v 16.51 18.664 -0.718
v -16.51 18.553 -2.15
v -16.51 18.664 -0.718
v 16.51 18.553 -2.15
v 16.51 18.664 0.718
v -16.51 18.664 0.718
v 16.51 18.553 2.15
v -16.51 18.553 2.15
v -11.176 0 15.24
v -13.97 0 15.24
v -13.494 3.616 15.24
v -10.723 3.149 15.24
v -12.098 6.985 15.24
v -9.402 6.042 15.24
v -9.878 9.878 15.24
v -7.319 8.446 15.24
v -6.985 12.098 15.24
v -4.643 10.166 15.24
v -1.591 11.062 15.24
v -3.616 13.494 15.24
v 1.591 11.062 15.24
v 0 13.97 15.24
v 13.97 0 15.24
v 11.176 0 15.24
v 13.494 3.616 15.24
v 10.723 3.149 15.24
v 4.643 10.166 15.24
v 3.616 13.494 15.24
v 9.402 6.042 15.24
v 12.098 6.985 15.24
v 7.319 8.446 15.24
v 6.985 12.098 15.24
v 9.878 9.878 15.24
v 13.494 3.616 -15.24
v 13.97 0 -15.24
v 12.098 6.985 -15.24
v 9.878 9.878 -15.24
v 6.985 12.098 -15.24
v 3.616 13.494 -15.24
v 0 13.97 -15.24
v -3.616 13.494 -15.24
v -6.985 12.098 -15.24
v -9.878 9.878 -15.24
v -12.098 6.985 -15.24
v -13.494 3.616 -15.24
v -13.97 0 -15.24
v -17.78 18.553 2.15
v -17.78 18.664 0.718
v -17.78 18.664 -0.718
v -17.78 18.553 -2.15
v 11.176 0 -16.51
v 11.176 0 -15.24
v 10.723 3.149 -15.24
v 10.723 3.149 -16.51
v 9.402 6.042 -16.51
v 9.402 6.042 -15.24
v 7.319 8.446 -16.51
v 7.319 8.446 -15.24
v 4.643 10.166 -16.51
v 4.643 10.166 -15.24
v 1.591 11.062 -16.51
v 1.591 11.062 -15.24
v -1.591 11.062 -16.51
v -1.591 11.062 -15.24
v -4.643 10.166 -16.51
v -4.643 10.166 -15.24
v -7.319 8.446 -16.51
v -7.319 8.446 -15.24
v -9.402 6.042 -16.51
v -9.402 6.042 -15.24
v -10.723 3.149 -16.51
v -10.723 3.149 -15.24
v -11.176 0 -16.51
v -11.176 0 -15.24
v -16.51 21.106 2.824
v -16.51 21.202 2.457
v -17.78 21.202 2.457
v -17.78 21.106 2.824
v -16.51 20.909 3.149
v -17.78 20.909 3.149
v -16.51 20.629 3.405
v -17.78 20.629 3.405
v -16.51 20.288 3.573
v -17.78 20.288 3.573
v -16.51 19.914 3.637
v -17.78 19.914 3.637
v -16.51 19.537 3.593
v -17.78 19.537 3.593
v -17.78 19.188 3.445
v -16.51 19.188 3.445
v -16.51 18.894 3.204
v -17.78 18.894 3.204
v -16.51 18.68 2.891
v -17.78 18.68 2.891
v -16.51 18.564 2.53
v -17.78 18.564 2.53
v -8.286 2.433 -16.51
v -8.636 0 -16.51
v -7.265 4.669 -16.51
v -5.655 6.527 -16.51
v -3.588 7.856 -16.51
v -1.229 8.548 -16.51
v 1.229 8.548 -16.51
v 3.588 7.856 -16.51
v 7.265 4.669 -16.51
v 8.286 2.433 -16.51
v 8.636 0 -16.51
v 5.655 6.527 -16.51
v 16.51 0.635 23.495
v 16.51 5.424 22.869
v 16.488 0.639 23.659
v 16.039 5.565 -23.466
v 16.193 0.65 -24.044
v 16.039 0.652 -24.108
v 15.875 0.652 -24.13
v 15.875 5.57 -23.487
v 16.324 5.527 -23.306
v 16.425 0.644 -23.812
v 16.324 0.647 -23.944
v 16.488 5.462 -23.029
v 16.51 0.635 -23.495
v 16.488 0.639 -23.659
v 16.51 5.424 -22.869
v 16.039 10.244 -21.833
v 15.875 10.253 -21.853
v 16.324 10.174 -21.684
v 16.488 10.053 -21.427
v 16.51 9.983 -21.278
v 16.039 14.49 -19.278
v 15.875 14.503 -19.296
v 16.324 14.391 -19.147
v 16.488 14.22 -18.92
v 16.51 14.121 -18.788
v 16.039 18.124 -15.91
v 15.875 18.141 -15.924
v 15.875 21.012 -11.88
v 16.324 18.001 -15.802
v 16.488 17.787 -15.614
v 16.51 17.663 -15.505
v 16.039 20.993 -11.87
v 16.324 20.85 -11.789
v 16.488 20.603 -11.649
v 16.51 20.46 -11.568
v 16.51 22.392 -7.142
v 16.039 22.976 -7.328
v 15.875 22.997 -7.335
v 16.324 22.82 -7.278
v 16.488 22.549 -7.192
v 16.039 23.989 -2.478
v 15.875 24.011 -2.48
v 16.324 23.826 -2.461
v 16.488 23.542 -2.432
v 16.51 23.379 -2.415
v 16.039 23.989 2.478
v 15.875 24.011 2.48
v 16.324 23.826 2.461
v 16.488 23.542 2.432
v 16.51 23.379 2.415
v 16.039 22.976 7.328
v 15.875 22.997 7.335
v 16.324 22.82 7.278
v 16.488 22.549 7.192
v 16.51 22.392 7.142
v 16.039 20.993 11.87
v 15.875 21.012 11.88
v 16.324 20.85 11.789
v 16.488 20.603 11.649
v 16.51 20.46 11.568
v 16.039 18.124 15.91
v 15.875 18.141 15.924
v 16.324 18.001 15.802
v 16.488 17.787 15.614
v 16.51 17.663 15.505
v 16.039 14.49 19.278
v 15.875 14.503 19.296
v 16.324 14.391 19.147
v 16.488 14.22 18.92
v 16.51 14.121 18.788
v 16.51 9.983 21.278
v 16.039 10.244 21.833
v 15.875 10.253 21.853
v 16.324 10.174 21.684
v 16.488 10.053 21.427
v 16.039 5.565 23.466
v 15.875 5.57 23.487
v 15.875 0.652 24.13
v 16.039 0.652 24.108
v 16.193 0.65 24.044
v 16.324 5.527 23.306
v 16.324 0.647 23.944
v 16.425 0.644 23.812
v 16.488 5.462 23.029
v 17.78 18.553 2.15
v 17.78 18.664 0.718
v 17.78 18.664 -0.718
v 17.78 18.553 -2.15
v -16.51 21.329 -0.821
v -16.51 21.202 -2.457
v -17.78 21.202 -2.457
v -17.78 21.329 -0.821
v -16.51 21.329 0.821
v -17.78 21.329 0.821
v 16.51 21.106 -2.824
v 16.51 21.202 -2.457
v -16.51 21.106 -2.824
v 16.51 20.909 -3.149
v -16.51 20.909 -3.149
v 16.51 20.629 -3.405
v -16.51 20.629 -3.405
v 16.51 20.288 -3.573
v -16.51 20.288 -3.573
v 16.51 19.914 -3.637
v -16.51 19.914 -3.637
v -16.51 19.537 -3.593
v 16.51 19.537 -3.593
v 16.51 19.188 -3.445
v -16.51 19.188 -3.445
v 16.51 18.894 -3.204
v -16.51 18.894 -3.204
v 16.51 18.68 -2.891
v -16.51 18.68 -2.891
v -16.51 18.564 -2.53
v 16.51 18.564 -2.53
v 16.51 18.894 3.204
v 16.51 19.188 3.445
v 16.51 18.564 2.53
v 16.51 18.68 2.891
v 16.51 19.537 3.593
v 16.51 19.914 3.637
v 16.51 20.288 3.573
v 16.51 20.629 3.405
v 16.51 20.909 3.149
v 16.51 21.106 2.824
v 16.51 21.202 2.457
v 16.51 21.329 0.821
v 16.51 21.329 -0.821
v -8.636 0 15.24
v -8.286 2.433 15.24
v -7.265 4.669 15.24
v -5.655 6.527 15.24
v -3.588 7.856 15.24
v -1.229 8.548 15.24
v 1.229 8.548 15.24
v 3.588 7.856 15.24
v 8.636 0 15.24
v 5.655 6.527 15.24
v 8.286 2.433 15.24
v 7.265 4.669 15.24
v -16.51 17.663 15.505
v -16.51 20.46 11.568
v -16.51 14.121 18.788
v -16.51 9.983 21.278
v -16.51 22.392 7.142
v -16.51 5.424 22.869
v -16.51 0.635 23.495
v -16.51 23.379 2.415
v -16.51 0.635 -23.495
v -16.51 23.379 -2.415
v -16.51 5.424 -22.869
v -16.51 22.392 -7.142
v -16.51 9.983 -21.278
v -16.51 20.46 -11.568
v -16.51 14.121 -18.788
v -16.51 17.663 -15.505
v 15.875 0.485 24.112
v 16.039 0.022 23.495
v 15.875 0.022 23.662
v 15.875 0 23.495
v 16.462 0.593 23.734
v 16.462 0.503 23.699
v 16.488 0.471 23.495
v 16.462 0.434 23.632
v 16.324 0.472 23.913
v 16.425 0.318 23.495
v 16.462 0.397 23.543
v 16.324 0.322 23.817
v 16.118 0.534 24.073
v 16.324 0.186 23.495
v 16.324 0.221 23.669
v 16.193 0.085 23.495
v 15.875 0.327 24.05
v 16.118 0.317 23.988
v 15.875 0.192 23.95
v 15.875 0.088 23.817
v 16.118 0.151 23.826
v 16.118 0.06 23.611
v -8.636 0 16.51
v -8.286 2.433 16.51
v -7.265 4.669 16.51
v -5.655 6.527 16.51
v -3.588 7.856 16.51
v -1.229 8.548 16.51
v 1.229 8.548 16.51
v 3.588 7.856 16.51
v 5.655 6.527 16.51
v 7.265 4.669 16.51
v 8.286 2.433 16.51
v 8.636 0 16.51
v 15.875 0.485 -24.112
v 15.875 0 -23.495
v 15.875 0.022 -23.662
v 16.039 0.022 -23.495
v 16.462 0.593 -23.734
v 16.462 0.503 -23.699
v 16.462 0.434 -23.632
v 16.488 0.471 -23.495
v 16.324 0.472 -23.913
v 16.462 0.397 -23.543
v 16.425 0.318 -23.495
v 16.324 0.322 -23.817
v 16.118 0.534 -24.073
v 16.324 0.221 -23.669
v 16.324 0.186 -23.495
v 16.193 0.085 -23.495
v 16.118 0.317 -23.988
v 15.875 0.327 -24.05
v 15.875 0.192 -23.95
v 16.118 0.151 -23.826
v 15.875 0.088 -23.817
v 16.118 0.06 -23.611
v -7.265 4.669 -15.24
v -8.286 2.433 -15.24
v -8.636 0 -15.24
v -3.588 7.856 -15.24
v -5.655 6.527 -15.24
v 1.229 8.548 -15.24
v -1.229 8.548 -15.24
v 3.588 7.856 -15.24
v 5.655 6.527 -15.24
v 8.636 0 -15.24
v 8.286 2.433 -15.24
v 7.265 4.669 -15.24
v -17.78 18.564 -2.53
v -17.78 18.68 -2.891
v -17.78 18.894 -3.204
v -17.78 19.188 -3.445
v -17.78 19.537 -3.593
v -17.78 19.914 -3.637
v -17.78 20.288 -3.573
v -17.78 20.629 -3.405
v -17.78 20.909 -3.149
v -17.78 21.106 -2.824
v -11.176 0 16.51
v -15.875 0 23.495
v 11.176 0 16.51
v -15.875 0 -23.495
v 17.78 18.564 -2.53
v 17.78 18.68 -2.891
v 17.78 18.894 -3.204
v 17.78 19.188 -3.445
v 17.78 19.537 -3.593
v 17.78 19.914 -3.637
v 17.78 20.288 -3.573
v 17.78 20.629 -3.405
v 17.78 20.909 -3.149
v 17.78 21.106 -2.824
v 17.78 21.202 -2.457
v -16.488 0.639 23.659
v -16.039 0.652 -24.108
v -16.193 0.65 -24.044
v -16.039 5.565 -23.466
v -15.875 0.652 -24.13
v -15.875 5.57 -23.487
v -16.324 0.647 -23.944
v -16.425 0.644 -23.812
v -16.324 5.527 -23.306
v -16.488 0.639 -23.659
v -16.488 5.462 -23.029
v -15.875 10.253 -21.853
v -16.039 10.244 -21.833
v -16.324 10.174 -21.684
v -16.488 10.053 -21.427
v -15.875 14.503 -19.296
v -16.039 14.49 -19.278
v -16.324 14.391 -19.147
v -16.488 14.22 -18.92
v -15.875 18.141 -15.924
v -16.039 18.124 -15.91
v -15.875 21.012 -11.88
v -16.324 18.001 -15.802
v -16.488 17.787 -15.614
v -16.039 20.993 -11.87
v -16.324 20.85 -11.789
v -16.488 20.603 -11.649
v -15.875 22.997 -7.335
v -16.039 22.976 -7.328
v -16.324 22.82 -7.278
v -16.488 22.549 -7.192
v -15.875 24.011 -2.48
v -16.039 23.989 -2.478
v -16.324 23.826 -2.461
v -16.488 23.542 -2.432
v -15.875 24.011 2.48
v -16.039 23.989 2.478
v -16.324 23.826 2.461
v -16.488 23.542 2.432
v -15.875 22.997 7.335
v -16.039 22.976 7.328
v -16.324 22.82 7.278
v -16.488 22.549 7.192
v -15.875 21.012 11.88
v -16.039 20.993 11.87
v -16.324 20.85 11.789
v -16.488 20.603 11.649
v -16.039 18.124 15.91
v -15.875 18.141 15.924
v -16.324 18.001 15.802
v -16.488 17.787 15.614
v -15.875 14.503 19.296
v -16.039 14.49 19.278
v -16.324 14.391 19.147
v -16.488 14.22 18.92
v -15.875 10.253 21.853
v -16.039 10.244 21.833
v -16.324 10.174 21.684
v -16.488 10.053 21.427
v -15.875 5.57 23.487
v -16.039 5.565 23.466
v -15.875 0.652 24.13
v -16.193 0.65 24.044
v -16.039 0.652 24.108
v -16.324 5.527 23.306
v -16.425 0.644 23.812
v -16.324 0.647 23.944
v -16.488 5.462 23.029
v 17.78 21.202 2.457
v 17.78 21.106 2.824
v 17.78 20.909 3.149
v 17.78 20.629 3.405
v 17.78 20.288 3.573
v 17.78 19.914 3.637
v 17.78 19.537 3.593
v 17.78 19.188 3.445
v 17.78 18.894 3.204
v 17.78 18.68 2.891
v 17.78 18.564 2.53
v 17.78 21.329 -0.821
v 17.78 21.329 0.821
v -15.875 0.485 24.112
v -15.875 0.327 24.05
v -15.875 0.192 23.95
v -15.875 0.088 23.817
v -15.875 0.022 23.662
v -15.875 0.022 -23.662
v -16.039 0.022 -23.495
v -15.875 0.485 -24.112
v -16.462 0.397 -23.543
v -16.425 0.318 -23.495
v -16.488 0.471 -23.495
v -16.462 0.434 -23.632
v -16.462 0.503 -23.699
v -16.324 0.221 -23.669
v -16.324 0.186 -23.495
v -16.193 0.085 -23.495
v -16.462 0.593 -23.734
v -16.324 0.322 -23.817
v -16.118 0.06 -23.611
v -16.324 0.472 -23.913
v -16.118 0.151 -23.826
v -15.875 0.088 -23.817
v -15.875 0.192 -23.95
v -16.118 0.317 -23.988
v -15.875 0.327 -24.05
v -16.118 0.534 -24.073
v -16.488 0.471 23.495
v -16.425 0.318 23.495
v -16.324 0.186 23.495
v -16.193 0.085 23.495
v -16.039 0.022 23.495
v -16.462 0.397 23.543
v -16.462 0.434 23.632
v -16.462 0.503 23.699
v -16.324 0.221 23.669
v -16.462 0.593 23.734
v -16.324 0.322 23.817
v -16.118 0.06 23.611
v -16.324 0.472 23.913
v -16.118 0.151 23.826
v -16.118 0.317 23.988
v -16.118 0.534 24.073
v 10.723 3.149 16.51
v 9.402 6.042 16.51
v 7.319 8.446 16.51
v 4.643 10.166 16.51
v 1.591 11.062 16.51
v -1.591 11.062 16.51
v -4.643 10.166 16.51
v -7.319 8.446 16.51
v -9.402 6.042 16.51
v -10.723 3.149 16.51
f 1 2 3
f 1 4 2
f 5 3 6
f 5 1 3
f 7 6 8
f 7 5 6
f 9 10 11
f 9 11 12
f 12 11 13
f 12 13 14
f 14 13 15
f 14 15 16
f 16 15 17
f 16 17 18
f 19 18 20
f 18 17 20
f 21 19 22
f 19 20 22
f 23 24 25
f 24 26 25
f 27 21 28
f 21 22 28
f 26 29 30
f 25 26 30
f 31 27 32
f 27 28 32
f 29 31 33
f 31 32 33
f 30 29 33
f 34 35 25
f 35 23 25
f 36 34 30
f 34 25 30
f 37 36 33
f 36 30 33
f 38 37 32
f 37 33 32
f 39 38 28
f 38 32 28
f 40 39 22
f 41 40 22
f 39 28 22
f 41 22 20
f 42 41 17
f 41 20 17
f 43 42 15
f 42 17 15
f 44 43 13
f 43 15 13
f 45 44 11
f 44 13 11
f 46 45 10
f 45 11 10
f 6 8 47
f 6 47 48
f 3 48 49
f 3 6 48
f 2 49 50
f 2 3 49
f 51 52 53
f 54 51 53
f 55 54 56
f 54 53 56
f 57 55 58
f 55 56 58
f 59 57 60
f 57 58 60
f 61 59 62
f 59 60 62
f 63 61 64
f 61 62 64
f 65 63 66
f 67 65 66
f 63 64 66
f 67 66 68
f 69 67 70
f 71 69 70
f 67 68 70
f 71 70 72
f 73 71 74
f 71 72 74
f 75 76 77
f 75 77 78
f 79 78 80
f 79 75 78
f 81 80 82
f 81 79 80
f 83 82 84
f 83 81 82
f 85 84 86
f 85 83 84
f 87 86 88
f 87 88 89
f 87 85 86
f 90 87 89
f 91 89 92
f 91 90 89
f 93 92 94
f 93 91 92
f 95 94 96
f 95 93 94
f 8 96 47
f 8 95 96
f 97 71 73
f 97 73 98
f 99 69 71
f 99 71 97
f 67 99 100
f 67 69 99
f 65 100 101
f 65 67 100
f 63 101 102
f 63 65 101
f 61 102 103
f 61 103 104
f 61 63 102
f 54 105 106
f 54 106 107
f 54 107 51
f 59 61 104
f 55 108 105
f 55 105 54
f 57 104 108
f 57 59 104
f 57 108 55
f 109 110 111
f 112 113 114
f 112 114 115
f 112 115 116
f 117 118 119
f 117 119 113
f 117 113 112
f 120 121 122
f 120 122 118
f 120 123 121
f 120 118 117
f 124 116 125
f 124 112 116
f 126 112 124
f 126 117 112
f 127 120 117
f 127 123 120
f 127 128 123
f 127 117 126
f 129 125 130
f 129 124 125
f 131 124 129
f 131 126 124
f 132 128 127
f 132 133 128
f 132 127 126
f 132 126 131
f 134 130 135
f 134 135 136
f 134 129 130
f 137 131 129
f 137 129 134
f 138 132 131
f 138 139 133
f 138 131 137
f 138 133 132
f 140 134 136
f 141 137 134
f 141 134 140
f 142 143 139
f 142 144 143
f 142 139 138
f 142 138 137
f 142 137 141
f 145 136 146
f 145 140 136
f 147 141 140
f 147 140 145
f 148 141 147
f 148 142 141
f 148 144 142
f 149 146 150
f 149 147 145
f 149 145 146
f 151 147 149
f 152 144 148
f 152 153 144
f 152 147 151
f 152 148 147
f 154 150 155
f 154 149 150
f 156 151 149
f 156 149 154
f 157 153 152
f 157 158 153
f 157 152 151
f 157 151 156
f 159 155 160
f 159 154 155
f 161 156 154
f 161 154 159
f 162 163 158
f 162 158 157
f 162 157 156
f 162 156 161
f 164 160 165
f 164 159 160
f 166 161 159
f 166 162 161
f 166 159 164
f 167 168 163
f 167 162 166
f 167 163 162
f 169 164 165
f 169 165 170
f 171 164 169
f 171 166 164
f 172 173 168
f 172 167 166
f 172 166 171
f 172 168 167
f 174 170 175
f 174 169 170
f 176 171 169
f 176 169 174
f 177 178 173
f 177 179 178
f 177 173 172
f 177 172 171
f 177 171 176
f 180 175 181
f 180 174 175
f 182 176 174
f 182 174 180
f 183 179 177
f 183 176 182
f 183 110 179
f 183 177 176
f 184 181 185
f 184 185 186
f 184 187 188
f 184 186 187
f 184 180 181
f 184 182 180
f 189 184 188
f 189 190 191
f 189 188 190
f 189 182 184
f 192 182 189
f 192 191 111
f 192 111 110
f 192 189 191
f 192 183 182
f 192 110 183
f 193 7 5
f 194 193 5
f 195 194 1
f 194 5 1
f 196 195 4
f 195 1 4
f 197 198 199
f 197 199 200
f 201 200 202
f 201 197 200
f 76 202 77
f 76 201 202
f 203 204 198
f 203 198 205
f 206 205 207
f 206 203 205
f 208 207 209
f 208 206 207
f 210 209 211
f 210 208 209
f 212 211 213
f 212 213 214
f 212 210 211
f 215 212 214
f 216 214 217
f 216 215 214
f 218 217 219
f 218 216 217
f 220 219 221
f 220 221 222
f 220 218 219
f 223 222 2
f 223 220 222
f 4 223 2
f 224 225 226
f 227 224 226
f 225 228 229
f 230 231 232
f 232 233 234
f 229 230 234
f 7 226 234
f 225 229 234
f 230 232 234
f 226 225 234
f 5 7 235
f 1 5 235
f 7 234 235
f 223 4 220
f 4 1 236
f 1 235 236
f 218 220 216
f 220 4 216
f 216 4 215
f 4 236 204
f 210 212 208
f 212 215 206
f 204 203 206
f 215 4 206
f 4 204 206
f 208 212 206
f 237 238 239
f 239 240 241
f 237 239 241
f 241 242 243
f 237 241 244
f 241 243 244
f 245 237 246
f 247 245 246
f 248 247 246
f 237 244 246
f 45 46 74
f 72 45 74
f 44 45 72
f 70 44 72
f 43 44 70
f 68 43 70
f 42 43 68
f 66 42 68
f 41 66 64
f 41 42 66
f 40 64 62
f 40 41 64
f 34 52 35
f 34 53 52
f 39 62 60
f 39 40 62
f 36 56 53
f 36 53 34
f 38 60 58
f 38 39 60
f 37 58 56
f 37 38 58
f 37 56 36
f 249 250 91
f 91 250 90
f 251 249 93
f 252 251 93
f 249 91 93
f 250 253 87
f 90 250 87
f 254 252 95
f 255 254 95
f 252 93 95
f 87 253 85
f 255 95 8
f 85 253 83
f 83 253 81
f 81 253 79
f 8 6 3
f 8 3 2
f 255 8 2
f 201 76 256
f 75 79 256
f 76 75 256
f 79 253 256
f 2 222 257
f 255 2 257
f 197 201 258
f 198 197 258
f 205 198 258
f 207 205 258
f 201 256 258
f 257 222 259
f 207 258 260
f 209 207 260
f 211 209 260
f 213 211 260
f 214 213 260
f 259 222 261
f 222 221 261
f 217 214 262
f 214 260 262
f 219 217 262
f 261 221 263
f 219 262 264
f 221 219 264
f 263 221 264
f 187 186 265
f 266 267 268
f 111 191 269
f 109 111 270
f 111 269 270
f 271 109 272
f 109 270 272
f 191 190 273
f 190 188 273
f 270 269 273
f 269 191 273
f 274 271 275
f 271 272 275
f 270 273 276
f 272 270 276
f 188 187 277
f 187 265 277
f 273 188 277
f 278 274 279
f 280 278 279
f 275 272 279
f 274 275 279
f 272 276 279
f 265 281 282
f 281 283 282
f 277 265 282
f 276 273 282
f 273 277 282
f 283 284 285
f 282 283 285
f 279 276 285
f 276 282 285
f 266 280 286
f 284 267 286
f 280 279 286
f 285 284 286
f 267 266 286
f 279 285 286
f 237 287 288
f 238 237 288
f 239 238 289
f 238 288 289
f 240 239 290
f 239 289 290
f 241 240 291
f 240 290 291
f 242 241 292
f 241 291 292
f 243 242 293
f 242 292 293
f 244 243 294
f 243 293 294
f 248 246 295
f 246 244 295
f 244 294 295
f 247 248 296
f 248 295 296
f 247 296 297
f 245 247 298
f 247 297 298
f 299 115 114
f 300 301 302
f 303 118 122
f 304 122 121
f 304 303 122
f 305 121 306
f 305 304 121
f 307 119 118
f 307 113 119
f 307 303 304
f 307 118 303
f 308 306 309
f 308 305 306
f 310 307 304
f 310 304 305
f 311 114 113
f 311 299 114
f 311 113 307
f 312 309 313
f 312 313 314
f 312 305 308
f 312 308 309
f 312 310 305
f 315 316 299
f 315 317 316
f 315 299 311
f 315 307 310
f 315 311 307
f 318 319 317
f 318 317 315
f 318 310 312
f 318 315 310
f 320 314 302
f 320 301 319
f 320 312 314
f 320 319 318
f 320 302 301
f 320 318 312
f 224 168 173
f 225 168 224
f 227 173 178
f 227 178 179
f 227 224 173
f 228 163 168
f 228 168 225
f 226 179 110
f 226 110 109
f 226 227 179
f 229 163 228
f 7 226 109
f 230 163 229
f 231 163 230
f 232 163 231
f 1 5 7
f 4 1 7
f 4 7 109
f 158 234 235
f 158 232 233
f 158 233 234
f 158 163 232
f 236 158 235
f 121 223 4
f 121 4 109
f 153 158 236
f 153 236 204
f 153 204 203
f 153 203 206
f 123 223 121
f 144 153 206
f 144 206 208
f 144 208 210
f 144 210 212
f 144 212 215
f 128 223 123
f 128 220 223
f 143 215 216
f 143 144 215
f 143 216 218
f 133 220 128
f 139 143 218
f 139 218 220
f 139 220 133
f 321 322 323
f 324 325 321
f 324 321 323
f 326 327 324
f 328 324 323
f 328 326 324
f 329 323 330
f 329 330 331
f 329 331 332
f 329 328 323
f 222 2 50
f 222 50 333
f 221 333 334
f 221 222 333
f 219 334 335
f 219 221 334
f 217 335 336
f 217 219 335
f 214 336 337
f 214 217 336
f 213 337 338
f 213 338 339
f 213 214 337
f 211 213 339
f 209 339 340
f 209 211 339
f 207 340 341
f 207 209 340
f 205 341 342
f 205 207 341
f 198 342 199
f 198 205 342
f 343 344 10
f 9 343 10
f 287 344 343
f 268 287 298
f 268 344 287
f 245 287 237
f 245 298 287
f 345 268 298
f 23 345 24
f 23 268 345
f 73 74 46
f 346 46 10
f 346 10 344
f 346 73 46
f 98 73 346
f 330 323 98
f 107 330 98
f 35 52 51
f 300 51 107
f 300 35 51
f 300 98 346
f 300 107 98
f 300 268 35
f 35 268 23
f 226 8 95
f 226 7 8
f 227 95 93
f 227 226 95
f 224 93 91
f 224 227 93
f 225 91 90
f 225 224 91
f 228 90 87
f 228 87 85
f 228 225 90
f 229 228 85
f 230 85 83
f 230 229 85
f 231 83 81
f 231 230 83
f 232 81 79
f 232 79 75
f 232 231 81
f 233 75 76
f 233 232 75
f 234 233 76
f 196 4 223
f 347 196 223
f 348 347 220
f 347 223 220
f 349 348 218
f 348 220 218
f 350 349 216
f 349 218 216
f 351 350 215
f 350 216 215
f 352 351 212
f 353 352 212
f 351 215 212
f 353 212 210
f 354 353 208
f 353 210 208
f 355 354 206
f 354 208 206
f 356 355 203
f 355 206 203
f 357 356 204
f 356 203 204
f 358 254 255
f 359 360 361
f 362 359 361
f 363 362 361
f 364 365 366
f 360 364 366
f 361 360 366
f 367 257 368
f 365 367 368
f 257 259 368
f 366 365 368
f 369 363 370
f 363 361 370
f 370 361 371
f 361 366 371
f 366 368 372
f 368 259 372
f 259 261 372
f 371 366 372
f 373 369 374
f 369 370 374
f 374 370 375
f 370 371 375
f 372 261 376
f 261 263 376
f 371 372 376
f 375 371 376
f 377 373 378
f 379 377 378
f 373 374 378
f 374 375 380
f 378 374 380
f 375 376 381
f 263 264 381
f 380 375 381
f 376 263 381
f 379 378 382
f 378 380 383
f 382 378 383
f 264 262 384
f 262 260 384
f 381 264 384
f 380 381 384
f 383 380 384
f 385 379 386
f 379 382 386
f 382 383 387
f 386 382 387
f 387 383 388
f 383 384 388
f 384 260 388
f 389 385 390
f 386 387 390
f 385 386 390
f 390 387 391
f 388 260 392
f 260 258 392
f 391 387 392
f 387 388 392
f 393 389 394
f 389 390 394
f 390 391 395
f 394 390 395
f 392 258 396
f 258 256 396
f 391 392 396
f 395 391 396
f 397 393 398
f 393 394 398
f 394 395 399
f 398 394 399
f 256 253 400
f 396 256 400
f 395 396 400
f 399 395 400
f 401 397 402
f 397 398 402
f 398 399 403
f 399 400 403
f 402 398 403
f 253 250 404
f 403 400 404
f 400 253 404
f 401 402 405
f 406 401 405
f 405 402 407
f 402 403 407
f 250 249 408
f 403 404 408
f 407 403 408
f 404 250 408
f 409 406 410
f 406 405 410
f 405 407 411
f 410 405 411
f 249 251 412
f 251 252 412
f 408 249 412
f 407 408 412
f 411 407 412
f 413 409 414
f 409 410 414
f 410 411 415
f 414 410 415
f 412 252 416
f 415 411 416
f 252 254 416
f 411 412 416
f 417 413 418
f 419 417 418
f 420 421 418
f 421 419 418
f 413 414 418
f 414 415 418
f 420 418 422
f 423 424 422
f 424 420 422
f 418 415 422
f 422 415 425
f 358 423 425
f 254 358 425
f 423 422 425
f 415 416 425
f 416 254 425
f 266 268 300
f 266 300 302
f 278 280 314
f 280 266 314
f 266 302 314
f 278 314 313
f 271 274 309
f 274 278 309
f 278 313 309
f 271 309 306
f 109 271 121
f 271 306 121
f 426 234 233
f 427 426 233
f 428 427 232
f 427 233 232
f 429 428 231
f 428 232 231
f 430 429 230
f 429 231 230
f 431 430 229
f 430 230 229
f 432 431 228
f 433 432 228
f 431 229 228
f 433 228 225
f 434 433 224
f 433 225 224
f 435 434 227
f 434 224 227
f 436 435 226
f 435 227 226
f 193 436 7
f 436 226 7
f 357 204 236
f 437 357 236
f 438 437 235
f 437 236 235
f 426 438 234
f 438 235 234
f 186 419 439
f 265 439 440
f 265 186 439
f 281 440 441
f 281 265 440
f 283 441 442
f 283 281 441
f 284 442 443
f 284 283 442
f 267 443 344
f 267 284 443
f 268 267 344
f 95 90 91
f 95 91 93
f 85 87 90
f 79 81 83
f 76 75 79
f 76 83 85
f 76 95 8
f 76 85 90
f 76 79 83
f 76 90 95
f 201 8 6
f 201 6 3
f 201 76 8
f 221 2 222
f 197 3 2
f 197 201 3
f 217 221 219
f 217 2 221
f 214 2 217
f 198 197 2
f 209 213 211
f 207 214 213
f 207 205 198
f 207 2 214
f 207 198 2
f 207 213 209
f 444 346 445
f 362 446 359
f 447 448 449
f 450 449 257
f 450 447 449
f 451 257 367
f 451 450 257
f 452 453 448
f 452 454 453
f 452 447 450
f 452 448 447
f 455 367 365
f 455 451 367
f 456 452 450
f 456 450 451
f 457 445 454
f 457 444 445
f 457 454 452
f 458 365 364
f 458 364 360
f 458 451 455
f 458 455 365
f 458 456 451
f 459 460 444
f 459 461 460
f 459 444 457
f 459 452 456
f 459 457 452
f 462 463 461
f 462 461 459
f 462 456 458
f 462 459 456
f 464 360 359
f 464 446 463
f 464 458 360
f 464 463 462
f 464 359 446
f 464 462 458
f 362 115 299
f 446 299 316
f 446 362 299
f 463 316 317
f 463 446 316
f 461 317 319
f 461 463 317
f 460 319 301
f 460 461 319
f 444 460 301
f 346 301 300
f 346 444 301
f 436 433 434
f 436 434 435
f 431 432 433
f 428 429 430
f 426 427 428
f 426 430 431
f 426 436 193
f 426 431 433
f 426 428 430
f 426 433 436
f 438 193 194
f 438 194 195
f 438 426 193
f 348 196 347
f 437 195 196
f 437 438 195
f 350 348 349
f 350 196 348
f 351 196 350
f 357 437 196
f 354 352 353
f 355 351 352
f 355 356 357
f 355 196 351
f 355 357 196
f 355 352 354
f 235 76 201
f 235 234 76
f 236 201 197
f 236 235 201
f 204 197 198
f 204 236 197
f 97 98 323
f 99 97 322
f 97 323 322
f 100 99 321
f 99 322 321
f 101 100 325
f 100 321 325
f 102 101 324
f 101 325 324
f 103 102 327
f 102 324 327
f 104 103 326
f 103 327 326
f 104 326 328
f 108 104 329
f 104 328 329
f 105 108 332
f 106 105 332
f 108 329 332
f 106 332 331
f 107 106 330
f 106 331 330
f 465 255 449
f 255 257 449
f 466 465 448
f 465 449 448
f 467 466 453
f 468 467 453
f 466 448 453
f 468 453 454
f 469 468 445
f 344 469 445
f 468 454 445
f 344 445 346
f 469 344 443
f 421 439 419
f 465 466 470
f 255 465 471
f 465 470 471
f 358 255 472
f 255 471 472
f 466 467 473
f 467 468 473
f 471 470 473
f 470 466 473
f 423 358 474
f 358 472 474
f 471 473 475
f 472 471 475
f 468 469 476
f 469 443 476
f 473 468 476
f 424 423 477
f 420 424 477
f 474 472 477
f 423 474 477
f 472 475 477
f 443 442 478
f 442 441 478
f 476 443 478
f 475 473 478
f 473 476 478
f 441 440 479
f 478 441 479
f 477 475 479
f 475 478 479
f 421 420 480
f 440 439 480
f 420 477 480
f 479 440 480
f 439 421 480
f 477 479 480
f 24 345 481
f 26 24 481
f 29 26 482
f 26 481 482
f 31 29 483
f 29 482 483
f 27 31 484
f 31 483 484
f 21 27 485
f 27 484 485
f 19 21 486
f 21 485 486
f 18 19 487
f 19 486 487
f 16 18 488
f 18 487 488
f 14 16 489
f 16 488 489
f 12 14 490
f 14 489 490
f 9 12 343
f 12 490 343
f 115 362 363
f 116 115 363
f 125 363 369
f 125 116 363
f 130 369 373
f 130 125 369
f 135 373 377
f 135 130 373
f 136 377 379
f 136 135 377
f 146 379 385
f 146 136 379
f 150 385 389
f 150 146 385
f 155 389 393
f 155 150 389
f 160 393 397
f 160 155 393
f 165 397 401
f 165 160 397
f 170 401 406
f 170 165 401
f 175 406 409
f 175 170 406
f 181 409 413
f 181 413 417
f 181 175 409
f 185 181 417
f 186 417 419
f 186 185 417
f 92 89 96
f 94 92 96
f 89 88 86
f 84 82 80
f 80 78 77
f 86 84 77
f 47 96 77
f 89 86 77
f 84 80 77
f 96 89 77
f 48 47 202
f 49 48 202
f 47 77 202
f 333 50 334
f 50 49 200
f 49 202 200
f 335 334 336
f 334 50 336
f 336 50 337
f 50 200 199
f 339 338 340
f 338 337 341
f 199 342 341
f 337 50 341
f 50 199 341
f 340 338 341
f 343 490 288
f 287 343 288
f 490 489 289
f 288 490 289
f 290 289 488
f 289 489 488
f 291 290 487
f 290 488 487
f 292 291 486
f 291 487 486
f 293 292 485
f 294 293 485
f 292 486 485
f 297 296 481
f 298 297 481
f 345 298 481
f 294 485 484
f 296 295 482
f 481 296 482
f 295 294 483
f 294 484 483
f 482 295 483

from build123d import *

# Parameters (mm, degrees)
MAIN_BODY_EXTRUDE_DEPTH = 16.51
INNER_HINGE_CUT_DEPTH   = 15.24
GROOVE_CUT_DEPTH        = 16.51
SLOT_START              = 16.51
SLOT_1_EXTRUDE_DEPTH    = 1.27
SLOT_START_2            = -16.51
SLOT_2_EXTRUDE_DEPTH    = 1.27
FILLET1_R               = 0.635


with BuildPart() as part:
    # Sketch6 → Main Body Extrude (new body, symmetric)
    with BuildSketch(Plane(origin=(0, 0, 0), x_dir=(0, 0, -1), z_dir=(1, 0, 0))):
        with BuildLine():
            ThreePointArc((24.138353817, 0), (0, 24.138353817), (-24.138353817, 0))
            Line((-24.138353817, 0), (24.138353817, 0))
        make_face()
        with BuildLine():
            ThreePointArc((2.45736216, 21.202424651), (3.628470035, 19.724266728), (2.150312111, 18.553158853))
            ThreePointArc((2.150312111, 18.553158853), (0, 18.677353817), (-2.150312111, 18.553158853))
            ThreePointArc((-2.150312111, 18.553158853), (-3.628470035, 19.724266728), (-2.45736216, 21.202424651))
            ThreePointArc((-2.45736216, 21.202424651), (0, 21.344353817), (2.45736216, 21.202424651))
        make_face(mode=Mode.SUBTRACT)
    extrude(amount=MAIN_BODY_EXTRUDE_DEPTH, both=True)

    # Sketch5<16> → Inner Hinge Cut (cut, symmetric)
    with BuildSketch(Plane.XY):
        with BuildLine():
            ThreePointArc((13.97, 0), (0, 13.97), (-13.97, 0))
            Line((-13.97, 0), (-12.7, 0))
            ThreePointArc((-12.7, 0), (0, 12.7), (12.7, 0))
            Line((12.7, 0), (13.97, 0))
        make_face()
        with BuildLine():
            ThreePointArc((12.446, 0), (0, 12.446), (-12.446, 0))
            Line((-12.446, 0), (-11.176, 0))
            ThreePointArc((-11.176, 0), (0, 11.176), (11.176, 0))
            Line((11.176, 0), (12.446, 0))
        make_face()
        with BuildLine():
            ThreePointArc((11.176, 0), (0, 11.176), (-11.176, 0))
            Line((-11.176, 0), (-8.636, 0))
            ThreePointArc((-8.636, 0), (0, 8.636), (8.636, 0))
            Line((8.636, 0), (11.176, 0))
        make_face()
        with BuildLine():
            ThreePointArc((8.636, 0), (0, 8.636), (-8.636, 0))
            Line((-8.636, 0), (8.636, 0))
        make_face()
        with BuildLine():
            ThreePointArc((12.7, 0), (0, 12.7), (-12.7, 0))
            Line((-12.7, 0), (-12.446, 0))
            ThreePointArc((-12.446, 0), (0, 12.446), (12.446, 0))
            Line((12.446, 0), (12.7, 0))
        make_face()
    extrude(amount=INNER_HINGE_CUT_DEPTH, both=True, mode=Mode.SUBTRACT)

    # Sketch5 → Groove Cut (cut, symmetric)
    with BuildSketch(Plane.XY):
        with BuildLine():
            ThreePointArc((11.176, 0), (0, 11.176), (-11.176, 0))
            Line((-11.176, 0), (-8.636, 0))
            ThreePointArc((-8.636, 0), (0, 8.636), (8.636, 0))
            Line((8.636, 0), (11.176, 0))
        make_face()
    extrude(amount=GROOVE_CUT_DEPTH, both=True, mode=Mode.SUBTRACT)

    # Fillet1
    fillet1_edges = [part.edges().sort_by_distance(p)[0] for p in [
        (0, 0, -24.138353817),
        (0, 0, 24.138353817),
        (16.51, 24.138353817, 0),
        (16.51, 0, 0),
        (-16.51, 0, 0),
        (-16.51, 24.138353817, 0),
    ]]
    fillet(fillet1_edges, radius=FILLET1_R)


with BuildPart() as body_2:
    # Sketch6<5> → Slot 1 Extrude (new body)
    with BuildSketch(Plane(origin=(0, 0, 0), x_dir=(0, 0, -1), z_dir=(1, 0, 0)).offset(SLOT_START)):
        with BuildLine():
            ThreePointArc((2.45736216, 21.202424651), (0, 21.344353817), (-2.45736216, 21.202424651))
            ThreePointArc((-2.45736216, 21.202424651), (-3.628470035, 19.724266728), (-2.150312111, 18.553158853))
            ThreePointArc((-2.150312111, 18.553158853), (0, 18.677353817), (2.150312111, 18.553158853))
            ThreePointArc((2.150312111, 18.553158853), (3.628470035, 19.724266728), (2.45736216, 21.202424651))
        make_face()
    extrude(amount=SLOT_1_EXTRUDE_DEPTH)


with BuildPart() as body_3:
    # Sketch6<6> → Slot 2 Extrude (new body)
    with BuildSketch(Plane(origin=(0, 0, 0), x_dir=(0, 0, -1), z_dir=(1, 0, 0)).offset(SLOT_START_2)):
        with BuildLine():
            ThreePointArc((2.45736216, 21.202424651), (0, 21.344353817), (-2.45736216, 21.202424651))
            ThreePointArc((-2.45736216, 21.202424651), (-3.628470035, 19.724266728), (-2.150312111, 18.553158853))
            ThreePointArc((-2.150312111, 18.553158853), (0, 18.677353817), (2.150312111, 18.553158853))
            ThreePointArc((2.150312111, 18.553158853), (3.628470035, 19.724266728), (2.45736216, 21.202424651))
        make_face()
    extrude(amount=-SLOT_2_EXTRUDE_DEPTH)


solid = Compound([part.part, body_2.part, body_3.part])
